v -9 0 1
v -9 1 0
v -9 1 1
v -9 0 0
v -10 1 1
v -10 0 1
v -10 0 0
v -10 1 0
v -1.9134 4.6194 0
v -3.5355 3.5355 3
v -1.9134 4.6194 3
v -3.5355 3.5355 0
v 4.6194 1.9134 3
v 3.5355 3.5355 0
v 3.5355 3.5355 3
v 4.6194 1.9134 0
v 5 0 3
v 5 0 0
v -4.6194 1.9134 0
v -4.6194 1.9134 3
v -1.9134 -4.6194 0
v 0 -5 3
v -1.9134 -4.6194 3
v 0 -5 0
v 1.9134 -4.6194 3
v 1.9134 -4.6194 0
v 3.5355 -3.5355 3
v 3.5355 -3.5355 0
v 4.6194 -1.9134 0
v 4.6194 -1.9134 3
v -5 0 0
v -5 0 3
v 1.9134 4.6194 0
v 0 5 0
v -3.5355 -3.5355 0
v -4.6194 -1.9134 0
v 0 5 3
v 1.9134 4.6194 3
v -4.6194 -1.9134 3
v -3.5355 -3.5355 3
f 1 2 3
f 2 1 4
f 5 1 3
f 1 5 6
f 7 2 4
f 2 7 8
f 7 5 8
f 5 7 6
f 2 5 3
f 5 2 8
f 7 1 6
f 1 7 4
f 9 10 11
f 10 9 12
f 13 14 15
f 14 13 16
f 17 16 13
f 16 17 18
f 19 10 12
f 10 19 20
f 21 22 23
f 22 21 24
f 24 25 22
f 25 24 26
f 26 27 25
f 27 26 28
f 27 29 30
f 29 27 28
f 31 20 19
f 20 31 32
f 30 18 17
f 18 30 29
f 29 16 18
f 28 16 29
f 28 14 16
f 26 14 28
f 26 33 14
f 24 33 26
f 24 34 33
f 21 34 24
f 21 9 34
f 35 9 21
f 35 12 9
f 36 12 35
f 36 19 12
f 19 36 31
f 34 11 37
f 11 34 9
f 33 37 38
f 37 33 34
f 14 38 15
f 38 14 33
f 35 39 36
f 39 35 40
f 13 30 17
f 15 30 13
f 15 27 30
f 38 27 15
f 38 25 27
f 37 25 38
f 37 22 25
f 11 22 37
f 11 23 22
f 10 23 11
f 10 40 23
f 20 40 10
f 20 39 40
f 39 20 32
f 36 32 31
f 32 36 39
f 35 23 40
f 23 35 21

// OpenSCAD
// file: myCylinder.scad
// Copyright Stephen Morrisson 2017
// All rights reserved

// rh Cent Cylinder
// rh Cylinder
use <myCube.scad>

module rhCentCylinder(c, rRadius, z)
{
    color(c) cylinder(h=z, r=rRadius, center=false);
}
translate([-15, -15, 0]) rhCentCylinder("red", 3, 2);

module rhCylinder(c, rRadius, z)
{
    translate([rRadius, rRadius, 0]) rhCentCylinder(c, rRadius, z);
}
translate([-15, 15, 0]) rhCylinder("blue", 2, 3);

module transCylinder(c, xO, yO, zO, rRadius, z)
{
    translate([xO, yO, zO]) rhCylinder(c, rRadius, z);
}
//transCylinder("red", 0,0,0, 4, 1);
transCylinder("green", 15, 15, 0, 2, 2);

module centRightCylinder(c, rRadius, z)
{
    rD = rRadius * 3.0;
    difference()
    {
        rhCentCylinder(c, rRadius, z);
        transCube(c, -rD, -rRadius, -rRadius,  rD, rD, rD);
    }
}
centRightCylinder("green", 2, 2);

module rightHalfCylinder(c, xO, yO, zO, rRadius, z)
{
    translate([xO, yO + rRadius, zO]) centRightCylinder(c, rRadius, z);
}
rightHalfCylinder("yellow", 10, 0, 0, 2, 1);

module leftHalfCylinder(c, xO, yO, zO, rRadius, z)
{
    translate([xO + rRadius, yO + rRadius, zO])
        rotate([0,0,180]) centRightCylinder(c, rRadius, z);
}
leftHalfCylinder("yellow", -10, 0, 0, 2, 1);

module topHalfCylinder(c, xO, yO, zO, rRadius, z)
{
    translate([xO + rRadius, yO, zO])
        rotate([0,0,90]) centRightCylinder(c, rRadius, z);
}
topHalfCylinder("yellow", 0, 10, 0, 2, 1);

module bottomHalfCylinder(c, xO, yO, zO, rRadius, z)
{
    translate([xO + rRadius, yO + rRadius, zO])
        rotate([0,0,270]) centRightCylinder(c, rRadius, z);
}
bottomHalfCylinder("yellow", 0, -10, 0, 2, 1);
// file: myCube.scad
// Copyright Stephen Morrisson 2017
// All rights reserved

// {xyz, rot, trans, tr} Cube

module xyzCube(c, x, y, z)
{
    color(c) cube([x, y, z], false);
}

module rotCube(c, rotX, rotY, rotZ, x, y, z)
{
    rotate([rotX, rotY, rotZ]) xyzCube(c, x, y, z);
}
translate([-15, 15, 0,])rotCube("green", 45, 45, 45, 2,2,2);

module transCube(c, xOffset, yOffset, zOffset, x, y, z)
{
    translate([xOffset, yOffset, zOffset]) xyzCube(c, x, y, z);
}
transCube("brown", -15, -15, 0, 3, 2, 1);


module trCube(c, rotX, rotY, rotZ, xO, yO, zO, x, y, z)
{
    translate([xO, yO, zO])
    rotate([rotX, rotY, rotZ])
    xyzCube(c, x, y, z);
}
//trCube("yellow", 0,0,0, 0,0,0, 2, 3, 4);
//trCube("green", 45, 45, 45, 4, 3, 1, 5, 6, 7);
//trCube("blue", 0, 0, 45, 20, 0, 0, 5, 6, 7);
trCube("orange", 0,0,0, -10, 0, 0, 1,1,1);
//trCube("orange", 45,0,0, -15, 0, 0, 1,1,1);
//trCube("orange", 0,45,0, -20, 0, 0, 1,1,1);
//trCube("orange", 0,0,45, -25, 0, 0, 1,1,1);
// main file
// Copyright Stephen Morrisson 2017
// All rights reserved

use <myCube.scad>
use <myCylinder.scad>


trCube("orange", 0,0,0, -10, 0, 0, 1,1,1);

rhCentCylinder("red", 5, 3); 
